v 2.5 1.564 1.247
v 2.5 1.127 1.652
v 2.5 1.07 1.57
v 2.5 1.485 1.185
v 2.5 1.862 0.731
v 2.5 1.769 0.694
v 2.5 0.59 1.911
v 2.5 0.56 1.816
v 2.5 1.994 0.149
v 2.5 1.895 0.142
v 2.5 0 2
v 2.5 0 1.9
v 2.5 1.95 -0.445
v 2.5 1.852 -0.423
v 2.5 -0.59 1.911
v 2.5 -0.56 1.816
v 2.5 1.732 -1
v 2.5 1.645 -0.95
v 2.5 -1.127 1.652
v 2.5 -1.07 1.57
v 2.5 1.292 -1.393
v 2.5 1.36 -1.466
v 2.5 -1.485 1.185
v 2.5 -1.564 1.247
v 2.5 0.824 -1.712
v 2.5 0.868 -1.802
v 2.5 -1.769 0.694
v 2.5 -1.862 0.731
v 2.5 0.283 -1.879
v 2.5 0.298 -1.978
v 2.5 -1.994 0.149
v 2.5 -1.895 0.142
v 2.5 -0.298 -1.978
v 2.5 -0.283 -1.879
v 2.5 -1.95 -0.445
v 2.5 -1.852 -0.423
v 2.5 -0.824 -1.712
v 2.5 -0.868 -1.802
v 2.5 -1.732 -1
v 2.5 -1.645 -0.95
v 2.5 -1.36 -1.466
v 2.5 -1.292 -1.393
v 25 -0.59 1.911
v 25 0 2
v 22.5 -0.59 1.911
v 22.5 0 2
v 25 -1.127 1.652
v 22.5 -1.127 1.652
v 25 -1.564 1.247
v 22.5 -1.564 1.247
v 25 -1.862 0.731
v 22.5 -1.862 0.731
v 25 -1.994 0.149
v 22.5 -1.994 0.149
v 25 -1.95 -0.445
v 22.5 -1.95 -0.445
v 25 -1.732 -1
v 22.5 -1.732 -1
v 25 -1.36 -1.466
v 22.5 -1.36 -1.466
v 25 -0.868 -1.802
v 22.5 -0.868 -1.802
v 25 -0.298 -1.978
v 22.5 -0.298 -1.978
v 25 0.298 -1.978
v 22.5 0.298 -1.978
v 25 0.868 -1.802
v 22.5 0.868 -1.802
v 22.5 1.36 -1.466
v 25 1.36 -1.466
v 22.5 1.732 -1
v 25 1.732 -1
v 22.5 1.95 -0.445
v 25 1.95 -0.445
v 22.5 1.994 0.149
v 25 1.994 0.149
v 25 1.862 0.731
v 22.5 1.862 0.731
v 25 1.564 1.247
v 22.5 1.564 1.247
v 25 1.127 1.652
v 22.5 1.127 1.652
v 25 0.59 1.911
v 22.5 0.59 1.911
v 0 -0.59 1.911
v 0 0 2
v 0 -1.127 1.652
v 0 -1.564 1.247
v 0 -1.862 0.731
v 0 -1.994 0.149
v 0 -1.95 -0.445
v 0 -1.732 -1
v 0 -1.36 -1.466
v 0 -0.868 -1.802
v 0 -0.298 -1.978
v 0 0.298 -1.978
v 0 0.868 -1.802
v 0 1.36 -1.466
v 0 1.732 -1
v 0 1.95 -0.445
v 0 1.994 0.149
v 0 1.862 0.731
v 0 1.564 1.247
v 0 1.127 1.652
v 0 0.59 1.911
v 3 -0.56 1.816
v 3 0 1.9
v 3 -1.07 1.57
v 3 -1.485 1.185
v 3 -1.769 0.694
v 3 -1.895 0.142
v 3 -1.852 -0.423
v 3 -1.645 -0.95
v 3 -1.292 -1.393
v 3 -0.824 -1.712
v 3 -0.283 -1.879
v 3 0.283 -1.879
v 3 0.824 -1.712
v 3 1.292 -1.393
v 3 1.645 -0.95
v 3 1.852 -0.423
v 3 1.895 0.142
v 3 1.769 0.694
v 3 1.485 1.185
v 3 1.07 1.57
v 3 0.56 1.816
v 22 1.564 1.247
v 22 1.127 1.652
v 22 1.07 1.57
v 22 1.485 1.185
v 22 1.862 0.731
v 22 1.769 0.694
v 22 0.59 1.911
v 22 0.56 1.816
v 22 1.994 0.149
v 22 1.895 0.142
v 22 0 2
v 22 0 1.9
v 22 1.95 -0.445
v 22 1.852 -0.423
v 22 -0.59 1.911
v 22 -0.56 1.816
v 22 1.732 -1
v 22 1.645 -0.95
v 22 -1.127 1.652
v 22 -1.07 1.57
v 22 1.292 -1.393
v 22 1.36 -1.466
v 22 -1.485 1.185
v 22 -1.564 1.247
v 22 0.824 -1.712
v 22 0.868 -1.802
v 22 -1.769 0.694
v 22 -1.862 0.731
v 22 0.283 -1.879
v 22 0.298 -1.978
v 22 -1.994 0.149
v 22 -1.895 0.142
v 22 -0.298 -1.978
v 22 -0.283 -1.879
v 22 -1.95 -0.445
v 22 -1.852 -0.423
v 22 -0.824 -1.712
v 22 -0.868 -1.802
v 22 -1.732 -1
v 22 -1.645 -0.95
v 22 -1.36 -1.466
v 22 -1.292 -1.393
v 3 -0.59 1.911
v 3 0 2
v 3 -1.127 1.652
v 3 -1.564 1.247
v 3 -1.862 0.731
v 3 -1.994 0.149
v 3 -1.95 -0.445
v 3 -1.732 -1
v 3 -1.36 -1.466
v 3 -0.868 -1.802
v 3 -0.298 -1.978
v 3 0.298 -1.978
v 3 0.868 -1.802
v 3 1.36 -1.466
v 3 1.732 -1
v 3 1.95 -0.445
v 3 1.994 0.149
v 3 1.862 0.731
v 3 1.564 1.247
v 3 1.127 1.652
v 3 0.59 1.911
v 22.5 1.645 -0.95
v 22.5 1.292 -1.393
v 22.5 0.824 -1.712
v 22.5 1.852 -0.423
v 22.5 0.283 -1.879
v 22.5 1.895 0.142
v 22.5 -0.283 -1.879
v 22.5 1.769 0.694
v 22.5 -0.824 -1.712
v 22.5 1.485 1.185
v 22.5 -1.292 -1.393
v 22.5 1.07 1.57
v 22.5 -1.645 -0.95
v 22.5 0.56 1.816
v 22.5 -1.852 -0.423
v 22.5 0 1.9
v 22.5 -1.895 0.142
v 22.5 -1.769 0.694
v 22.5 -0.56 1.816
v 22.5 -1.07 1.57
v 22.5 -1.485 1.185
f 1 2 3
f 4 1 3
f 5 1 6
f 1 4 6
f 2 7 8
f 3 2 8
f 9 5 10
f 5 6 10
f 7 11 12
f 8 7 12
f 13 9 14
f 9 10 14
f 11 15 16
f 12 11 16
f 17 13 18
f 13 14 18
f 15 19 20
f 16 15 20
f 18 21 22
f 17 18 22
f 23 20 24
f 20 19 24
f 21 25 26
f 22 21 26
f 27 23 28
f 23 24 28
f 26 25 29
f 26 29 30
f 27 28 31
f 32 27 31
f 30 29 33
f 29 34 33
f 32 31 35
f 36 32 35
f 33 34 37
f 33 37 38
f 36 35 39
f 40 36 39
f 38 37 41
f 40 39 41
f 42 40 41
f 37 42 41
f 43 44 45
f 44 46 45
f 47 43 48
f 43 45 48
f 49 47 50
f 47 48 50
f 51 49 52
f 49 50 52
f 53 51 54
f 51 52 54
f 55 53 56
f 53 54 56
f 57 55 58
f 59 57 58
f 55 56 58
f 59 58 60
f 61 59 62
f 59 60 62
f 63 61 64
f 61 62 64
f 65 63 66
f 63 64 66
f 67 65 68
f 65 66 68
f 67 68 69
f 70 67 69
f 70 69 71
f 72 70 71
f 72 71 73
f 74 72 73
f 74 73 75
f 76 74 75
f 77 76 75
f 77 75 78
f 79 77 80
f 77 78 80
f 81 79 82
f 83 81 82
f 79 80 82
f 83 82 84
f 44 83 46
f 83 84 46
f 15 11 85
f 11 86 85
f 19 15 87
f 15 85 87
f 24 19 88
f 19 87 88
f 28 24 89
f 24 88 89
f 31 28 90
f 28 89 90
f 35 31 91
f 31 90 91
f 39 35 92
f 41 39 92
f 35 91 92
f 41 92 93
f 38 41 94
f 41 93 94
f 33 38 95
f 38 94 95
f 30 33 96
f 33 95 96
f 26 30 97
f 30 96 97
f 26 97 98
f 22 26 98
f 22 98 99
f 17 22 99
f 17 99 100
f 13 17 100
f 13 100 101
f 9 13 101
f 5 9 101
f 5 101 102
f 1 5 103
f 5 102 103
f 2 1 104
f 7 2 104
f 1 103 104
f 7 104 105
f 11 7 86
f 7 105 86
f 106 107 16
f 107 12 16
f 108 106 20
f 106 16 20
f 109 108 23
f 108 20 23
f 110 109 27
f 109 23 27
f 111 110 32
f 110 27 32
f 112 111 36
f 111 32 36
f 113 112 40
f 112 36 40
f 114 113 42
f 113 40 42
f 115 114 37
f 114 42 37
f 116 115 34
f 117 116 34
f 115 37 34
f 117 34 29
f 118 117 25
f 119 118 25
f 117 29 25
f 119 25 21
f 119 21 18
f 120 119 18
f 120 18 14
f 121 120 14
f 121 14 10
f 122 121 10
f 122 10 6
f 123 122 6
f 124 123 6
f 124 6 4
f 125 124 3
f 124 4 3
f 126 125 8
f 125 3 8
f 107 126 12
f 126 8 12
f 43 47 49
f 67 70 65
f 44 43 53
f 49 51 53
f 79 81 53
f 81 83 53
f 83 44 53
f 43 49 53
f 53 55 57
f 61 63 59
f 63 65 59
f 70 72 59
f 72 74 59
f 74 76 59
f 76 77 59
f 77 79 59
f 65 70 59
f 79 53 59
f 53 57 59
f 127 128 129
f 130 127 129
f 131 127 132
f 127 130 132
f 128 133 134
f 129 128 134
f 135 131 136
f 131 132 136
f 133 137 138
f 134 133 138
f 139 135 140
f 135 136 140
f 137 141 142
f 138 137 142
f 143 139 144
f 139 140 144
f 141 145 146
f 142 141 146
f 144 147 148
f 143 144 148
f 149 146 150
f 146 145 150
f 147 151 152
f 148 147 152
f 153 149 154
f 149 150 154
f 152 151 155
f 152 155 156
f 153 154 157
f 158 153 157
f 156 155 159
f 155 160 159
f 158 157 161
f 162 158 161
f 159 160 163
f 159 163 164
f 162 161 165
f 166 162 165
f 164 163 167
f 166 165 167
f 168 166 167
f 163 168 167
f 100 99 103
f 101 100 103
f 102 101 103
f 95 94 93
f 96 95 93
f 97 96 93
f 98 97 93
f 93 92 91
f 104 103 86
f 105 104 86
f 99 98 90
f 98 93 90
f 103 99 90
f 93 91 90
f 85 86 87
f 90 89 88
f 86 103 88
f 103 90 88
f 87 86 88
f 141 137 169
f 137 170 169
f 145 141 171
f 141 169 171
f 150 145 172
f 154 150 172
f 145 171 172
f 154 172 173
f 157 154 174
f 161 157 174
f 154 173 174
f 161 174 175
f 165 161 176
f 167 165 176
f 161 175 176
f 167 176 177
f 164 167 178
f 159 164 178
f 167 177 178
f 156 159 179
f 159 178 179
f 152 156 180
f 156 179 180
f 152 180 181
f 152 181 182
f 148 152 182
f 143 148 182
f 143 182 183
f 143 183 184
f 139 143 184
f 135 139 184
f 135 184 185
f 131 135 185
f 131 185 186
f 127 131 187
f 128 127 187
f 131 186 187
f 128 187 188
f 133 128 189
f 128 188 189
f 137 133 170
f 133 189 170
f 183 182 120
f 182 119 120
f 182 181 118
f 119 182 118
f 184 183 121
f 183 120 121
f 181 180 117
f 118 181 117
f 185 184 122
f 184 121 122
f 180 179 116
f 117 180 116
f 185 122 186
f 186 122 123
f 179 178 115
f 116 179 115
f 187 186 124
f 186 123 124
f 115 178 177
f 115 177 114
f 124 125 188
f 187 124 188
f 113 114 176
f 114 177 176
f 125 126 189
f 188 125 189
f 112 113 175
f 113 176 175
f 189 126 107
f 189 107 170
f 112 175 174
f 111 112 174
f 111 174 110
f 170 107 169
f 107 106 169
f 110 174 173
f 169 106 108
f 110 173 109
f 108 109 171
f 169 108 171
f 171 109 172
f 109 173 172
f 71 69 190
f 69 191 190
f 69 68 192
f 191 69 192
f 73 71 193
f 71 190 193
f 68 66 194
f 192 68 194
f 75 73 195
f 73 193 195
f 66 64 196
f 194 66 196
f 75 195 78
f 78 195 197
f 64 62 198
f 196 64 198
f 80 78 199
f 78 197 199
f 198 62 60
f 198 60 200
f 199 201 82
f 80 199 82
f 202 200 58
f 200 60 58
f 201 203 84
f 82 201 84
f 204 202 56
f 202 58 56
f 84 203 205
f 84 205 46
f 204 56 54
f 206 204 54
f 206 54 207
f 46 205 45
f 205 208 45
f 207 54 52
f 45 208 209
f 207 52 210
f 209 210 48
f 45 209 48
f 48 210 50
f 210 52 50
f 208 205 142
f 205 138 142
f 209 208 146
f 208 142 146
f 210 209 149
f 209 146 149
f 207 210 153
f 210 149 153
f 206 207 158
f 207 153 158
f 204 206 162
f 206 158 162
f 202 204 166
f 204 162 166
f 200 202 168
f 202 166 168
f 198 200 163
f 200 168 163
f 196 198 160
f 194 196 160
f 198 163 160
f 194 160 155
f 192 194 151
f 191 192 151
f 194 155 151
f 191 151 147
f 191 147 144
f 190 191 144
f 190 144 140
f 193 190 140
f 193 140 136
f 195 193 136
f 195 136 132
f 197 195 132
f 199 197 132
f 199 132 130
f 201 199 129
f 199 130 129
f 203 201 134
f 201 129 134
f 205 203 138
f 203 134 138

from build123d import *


with BuildPart() as part:
    # Çizim1 → Döndür1 (revolve)
    with BuildSketch(Plane.XY, mode=Mode.PRIVATE) as d_nd_r1_sk:
        Polygon((0, 0), (25, 0), (25, 2), (22.5, 2), (22.5, 1.9), (22, 1.9), (22, 2), (3, 2), (3, 1.9), (2.5, 1.9), (2.5, 2), (0, 2), align=None)
    revolve(d_nd_r1_sk.sketch.rotate(Axis((0, 0, 0), (1, 0, 0)), 90), axis=Axis((0, 0, 0), (1, 0, 0)))


solid = part.part
